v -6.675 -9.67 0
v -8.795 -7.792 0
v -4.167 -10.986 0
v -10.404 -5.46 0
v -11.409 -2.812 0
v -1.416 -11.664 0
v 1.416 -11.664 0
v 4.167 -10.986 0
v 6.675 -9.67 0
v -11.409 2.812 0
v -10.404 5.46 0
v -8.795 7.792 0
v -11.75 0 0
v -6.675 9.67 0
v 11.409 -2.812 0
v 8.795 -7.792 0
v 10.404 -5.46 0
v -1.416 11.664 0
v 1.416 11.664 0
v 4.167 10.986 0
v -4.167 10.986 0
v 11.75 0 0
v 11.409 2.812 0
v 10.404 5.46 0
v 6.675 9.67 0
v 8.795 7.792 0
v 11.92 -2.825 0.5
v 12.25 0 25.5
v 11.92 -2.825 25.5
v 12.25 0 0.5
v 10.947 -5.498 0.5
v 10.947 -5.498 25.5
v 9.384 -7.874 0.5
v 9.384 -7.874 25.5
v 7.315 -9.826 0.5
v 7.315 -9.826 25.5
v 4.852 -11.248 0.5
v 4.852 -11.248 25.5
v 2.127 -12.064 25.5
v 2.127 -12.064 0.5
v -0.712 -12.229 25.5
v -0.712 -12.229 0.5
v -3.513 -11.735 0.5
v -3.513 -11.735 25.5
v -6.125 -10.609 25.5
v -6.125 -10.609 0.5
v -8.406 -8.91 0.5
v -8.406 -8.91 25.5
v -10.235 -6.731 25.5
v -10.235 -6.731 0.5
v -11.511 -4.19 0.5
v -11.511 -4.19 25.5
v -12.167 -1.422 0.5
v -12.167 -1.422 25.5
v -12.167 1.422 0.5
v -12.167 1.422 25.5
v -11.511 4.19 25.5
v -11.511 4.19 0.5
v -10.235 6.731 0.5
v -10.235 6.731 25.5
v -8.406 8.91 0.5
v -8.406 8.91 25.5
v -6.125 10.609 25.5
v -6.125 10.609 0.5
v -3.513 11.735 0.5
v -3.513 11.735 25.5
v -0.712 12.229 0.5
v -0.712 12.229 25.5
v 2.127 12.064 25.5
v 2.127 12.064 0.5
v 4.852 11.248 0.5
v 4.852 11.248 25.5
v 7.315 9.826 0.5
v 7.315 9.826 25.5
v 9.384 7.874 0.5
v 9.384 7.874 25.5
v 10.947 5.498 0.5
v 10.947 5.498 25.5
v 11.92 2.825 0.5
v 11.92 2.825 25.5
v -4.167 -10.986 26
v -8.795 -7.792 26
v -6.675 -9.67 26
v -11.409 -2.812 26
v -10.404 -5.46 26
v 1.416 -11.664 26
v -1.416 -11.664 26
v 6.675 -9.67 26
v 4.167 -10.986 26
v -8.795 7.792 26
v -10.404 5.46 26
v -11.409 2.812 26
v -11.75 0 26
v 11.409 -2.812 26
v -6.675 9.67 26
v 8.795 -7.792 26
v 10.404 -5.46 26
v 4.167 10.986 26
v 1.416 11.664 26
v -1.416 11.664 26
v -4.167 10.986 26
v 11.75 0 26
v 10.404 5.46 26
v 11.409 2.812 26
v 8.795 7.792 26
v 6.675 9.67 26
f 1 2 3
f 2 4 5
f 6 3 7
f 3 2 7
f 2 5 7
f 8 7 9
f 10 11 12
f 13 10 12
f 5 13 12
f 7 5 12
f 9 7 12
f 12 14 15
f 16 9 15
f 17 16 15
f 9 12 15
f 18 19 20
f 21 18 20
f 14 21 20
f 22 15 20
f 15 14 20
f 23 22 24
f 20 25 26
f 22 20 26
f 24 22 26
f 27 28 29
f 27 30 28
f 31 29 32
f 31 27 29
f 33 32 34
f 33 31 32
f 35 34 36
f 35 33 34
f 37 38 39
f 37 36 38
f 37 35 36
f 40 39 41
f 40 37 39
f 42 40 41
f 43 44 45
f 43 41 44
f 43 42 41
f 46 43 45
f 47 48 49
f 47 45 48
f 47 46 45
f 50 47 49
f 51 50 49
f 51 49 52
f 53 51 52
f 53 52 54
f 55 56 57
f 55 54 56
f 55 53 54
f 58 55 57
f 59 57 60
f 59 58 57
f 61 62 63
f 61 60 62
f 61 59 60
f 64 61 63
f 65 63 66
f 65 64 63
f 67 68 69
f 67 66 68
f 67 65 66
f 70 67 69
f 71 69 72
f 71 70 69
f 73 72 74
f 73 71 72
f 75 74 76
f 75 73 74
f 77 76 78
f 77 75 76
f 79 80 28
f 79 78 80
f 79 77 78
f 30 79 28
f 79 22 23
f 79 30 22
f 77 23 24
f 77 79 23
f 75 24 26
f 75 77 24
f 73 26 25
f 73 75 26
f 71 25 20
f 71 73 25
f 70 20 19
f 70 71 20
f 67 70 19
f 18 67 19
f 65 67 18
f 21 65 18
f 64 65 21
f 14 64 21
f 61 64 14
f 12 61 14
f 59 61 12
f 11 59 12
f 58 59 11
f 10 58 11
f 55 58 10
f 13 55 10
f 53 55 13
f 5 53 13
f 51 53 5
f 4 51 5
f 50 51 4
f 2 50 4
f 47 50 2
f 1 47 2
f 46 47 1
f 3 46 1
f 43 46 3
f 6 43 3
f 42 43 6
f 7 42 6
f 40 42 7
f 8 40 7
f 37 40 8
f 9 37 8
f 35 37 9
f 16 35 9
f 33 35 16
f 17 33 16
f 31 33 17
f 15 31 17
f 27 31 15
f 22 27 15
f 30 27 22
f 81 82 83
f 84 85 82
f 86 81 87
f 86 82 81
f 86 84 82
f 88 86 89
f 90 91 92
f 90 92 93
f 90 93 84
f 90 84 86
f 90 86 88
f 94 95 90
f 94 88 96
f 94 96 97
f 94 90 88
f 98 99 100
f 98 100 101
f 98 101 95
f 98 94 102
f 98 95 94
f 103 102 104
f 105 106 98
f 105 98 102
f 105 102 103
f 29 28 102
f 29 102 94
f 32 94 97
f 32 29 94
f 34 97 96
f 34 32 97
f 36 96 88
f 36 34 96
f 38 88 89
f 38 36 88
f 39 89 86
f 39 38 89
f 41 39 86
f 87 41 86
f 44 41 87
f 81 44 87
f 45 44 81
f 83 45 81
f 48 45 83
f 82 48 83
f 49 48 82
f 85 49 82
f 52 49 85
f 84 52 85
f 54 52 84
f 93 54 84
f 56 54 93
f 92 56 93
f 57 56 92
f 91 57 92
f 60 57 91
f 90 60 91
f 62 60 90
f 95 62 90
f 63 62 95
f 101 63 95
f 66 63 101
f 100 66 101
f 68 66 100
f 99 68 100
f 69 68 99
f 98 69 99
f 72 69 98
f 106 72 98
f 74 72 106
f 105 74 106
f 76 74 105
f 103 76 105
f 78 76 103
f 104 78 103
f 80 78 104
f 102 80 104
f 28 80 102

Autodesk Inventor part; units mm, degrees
ref_plane "YZ Plane" through (0, 0, 0) normal (1, 0, 0) x (0, 1, 0)
ref_plane "XZ Plane" through (0, 0, 0) normal (0, 1, 0) x (-1, 0, 0)
ref_plane "XY Plane" through (0, 0, 0) normal (0, 0, 1) x (1, 0, 0)
sketch "Sketch1" plane through (0, 0, 0) normal (0, 0, 1) x (1, 0, 0)
  circle A0 centre (0, 0) radius 12.25
  dimension "d0" = 24.5
extrude "Extrusion1" add sketch "Sketch1" along normal blind 26
chamfer "Chamfer1" distance 0.5 angle 45 1 edges at (-12.25, 0, 0)
chamfer "Chamfer2" distance 0.5 angle 45 1 edges at (-12.25, 0, 26)
properties part number "gearbox"
